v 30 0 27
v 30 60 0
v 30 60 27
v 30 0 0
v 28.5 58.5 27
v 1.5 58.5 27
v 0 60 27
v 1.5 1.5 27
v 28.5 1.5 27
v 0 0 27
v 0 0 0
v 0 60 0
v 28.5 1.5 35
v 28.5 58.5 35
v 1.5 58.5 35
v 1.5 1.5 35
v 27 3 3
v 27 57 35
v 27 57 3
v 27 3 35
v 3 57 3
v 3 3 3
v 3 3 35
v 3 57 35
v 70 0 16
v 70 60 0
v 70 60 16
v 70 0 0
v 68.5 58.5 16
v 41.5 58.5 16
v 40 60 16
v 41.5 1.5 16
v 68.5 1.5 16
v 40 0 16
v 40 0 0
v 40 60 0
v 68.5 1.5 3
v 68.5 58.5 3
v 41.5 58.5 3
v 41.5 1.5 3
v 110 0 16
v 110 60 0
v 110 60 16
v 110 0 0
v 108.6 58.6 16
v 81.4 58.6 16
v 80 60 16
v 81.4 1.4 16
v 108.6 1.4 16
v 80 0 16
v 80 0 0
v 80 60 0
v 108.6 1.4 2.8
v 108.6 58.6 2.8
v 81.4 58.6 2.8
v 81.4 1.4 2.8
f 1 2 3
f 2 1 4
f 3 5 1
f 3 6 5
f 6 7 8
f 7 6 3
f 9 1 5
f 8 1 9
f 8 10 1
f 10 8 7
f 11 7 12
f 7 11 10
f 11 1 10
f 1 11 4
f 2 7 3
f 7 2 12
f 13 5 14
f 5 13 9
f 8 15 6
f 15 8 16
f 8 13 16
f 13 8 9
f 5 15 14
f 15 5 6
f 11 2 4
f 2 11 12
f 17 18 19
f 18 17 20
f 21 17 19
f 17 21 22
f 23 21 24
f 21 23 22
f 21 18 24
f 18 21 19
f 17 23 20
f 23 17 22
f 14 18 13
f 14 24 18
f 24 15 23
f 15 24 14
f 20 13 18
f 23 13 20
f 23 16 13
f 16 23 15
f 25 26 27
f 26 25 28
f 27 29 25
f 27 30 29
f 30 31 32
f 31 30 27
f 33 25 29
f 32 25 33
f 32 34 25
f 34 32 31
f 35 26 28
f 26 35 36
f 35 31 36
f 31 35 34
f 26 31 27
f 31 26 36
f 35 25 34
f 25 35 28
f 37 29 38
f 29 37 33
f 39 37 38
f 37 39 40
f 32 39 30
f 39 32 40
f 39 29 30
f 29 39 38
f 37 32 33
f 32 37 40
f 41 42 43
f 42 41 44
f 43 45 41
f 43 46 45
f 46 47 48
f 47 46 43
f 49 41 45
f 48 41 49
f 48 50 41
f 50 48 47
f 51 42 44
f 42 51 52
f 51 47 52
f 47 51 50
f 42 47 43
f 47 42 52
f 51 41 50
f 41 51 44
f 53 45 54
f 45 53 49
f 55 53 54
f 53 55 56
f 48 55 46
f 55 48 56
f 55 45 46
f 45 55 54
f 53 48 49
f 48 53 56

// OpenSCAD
function dimensionCalc(x, y, z, mt, lid_pct, lid_overlap_pct) =
    // height of lower box, interior x, interior y
    [z * (1 - lid_pct * lid_overlap_pct), (x - 2 * mt), (y - 2 * mt)];

module cardBoxLid(x, y, z, mt, lid_pct) {
    difference() {
        cube([x, y, z * lid_pct]);
        translate([(mt) / 2, (mt) / 2, mt])
            cube([x - mt, y - mt, z * lid_pct - mt]);
    }
}

module cardBoxSpacedLid(x, y, z, mt, lid_pct) {
    side_spacing = .2; // mm to allow for actually getting the lid off
    difference() {
        cardBoxLid(x, y, z, mt, lid_pct);
        translate([(mt - side_spacing) / 2, (mt - side_spacing) / 2, mt - side_spacing])
            cube([x - (mt - side_spacing), y - (mt - side_spacing), z * lid_pct - (mt - side_spacing)]);
    }
}

module cardBoxInsertSlot(ix, h, mt) {
    union() {
        translate([mt, 0, 0])
            union() {
                cube([mt / 2, mt / 2, h]);
                translate([0, mt, 0])
                    cube([mt / 2, mt / 2, h]);
            }

        translate([ix + mt / 2, 0, 0])
            union() {
                cube([mt / 2, mt / 2, h]);
                translate([0, mt, 0])
                    cube([mt / 2, mt / 2, h]);
            }
    }
}

module cardBox(x, y, z, mt, lid_pct, lid_overlap_pct, slot_list) {
    l = dimensionCalc(x, y, z, mt, lid_pct, lid_overlap_pct);
    h = l[0];
    ix = l[1];
    iy = l[2];
    difference() {
        cube([x, y, z]);
        translate([mt, mt, mt])
            cube([ix, iy, z]);
        rotate([180, 0, 0])
            translate([0, -y, -z - mt])
                cardBoxLid(x, y, z, mt, lid_pct);
        translate([0, 0, h + mt])
            cube([x, y, lid_pct * lid_overlap_pct * z - mt]);
    }

    for (i = slot_list)
        color("purple")
            // adjust to put the min-max slots at the very edges of the interior
            translate([0, mt + (iy - 5 / 2 * mt) * i, mt])
                cardBoxInsertSlot(ix, h, mt);
}

module cardBoxDivider(x, y, z, mt, lid_pct, lid_overlap_pct) {
    l = dimensionCalc(x, y, z, mt, lid_pct, lid_overlap_pct);
    h = l[0];
    ix = l[1];
    iy = l[2];
    difference() {
        union() {
            translate([ix / 6, mt / 2, h / 2])
                rotate([90, 0, 0])
                    linear_extrude(mt / 2)
                        resize([ix / 3, h])
                            circle(1);

            translate([ix * 5 / 6, mt / 2, h / 2])
                rotate([90, 0, 0])
                    linear_extrude(mt / 2)
                        resize([ix * 2 / 6, h])
                            circle(1);

            cube([ix * 1 / 6, mt / 2, h]);

            translate([ix * 1 / 3, 0, 0])
                cube([ix * 2 / 6, mt / 2, h / 2]);

            translate([ix * 5 / 6, 0, 0])
                cube([ix * 1 / 6, mt / 2, h]);

            cube([ix, mt / 2, h / 2]);
        }

        translate([ix * 3 / 6, mt / 2, h / 2])
            rotate([90, 0, 0])
                linear_extrude(mt / 2)
                    resize([ix * 2 / 6, ix * 2 / 6])
                        circle(1);
    }
}

l_x = 30;
w_y = 60;
h_z = 40;
mt = 3;
lid_pct = .4;
overlap = .5;
$fn = 100;
eps = .0001;
dividers = [0, .5, 1];

// box
cardBox(l_x, w_y, h_z, mt, lid_pct, overlap, []);

// lid
color("red")
    translate([40, 0, 0])
        cardBoxLid(l_x, w_y, h_z, mt, lid_pct);

color("green")
    translate([80, 0, 0])
        cardBoxSpacedLid(l_x, w_y, h_z, mt, lid_pct);

// dividers
//color("yellow")
//    translate([-l_x-mt,0,0])
//    cardBoxDivider(l_x,w_y,h_z,mt,lid_pct,overlap);

//color("green")
//    translate([mt,(w_y)*.5-mt/4,mt])
//    cardBoxDivider(l_x,w_y,h_z,mt,lid_pct,overlap);
